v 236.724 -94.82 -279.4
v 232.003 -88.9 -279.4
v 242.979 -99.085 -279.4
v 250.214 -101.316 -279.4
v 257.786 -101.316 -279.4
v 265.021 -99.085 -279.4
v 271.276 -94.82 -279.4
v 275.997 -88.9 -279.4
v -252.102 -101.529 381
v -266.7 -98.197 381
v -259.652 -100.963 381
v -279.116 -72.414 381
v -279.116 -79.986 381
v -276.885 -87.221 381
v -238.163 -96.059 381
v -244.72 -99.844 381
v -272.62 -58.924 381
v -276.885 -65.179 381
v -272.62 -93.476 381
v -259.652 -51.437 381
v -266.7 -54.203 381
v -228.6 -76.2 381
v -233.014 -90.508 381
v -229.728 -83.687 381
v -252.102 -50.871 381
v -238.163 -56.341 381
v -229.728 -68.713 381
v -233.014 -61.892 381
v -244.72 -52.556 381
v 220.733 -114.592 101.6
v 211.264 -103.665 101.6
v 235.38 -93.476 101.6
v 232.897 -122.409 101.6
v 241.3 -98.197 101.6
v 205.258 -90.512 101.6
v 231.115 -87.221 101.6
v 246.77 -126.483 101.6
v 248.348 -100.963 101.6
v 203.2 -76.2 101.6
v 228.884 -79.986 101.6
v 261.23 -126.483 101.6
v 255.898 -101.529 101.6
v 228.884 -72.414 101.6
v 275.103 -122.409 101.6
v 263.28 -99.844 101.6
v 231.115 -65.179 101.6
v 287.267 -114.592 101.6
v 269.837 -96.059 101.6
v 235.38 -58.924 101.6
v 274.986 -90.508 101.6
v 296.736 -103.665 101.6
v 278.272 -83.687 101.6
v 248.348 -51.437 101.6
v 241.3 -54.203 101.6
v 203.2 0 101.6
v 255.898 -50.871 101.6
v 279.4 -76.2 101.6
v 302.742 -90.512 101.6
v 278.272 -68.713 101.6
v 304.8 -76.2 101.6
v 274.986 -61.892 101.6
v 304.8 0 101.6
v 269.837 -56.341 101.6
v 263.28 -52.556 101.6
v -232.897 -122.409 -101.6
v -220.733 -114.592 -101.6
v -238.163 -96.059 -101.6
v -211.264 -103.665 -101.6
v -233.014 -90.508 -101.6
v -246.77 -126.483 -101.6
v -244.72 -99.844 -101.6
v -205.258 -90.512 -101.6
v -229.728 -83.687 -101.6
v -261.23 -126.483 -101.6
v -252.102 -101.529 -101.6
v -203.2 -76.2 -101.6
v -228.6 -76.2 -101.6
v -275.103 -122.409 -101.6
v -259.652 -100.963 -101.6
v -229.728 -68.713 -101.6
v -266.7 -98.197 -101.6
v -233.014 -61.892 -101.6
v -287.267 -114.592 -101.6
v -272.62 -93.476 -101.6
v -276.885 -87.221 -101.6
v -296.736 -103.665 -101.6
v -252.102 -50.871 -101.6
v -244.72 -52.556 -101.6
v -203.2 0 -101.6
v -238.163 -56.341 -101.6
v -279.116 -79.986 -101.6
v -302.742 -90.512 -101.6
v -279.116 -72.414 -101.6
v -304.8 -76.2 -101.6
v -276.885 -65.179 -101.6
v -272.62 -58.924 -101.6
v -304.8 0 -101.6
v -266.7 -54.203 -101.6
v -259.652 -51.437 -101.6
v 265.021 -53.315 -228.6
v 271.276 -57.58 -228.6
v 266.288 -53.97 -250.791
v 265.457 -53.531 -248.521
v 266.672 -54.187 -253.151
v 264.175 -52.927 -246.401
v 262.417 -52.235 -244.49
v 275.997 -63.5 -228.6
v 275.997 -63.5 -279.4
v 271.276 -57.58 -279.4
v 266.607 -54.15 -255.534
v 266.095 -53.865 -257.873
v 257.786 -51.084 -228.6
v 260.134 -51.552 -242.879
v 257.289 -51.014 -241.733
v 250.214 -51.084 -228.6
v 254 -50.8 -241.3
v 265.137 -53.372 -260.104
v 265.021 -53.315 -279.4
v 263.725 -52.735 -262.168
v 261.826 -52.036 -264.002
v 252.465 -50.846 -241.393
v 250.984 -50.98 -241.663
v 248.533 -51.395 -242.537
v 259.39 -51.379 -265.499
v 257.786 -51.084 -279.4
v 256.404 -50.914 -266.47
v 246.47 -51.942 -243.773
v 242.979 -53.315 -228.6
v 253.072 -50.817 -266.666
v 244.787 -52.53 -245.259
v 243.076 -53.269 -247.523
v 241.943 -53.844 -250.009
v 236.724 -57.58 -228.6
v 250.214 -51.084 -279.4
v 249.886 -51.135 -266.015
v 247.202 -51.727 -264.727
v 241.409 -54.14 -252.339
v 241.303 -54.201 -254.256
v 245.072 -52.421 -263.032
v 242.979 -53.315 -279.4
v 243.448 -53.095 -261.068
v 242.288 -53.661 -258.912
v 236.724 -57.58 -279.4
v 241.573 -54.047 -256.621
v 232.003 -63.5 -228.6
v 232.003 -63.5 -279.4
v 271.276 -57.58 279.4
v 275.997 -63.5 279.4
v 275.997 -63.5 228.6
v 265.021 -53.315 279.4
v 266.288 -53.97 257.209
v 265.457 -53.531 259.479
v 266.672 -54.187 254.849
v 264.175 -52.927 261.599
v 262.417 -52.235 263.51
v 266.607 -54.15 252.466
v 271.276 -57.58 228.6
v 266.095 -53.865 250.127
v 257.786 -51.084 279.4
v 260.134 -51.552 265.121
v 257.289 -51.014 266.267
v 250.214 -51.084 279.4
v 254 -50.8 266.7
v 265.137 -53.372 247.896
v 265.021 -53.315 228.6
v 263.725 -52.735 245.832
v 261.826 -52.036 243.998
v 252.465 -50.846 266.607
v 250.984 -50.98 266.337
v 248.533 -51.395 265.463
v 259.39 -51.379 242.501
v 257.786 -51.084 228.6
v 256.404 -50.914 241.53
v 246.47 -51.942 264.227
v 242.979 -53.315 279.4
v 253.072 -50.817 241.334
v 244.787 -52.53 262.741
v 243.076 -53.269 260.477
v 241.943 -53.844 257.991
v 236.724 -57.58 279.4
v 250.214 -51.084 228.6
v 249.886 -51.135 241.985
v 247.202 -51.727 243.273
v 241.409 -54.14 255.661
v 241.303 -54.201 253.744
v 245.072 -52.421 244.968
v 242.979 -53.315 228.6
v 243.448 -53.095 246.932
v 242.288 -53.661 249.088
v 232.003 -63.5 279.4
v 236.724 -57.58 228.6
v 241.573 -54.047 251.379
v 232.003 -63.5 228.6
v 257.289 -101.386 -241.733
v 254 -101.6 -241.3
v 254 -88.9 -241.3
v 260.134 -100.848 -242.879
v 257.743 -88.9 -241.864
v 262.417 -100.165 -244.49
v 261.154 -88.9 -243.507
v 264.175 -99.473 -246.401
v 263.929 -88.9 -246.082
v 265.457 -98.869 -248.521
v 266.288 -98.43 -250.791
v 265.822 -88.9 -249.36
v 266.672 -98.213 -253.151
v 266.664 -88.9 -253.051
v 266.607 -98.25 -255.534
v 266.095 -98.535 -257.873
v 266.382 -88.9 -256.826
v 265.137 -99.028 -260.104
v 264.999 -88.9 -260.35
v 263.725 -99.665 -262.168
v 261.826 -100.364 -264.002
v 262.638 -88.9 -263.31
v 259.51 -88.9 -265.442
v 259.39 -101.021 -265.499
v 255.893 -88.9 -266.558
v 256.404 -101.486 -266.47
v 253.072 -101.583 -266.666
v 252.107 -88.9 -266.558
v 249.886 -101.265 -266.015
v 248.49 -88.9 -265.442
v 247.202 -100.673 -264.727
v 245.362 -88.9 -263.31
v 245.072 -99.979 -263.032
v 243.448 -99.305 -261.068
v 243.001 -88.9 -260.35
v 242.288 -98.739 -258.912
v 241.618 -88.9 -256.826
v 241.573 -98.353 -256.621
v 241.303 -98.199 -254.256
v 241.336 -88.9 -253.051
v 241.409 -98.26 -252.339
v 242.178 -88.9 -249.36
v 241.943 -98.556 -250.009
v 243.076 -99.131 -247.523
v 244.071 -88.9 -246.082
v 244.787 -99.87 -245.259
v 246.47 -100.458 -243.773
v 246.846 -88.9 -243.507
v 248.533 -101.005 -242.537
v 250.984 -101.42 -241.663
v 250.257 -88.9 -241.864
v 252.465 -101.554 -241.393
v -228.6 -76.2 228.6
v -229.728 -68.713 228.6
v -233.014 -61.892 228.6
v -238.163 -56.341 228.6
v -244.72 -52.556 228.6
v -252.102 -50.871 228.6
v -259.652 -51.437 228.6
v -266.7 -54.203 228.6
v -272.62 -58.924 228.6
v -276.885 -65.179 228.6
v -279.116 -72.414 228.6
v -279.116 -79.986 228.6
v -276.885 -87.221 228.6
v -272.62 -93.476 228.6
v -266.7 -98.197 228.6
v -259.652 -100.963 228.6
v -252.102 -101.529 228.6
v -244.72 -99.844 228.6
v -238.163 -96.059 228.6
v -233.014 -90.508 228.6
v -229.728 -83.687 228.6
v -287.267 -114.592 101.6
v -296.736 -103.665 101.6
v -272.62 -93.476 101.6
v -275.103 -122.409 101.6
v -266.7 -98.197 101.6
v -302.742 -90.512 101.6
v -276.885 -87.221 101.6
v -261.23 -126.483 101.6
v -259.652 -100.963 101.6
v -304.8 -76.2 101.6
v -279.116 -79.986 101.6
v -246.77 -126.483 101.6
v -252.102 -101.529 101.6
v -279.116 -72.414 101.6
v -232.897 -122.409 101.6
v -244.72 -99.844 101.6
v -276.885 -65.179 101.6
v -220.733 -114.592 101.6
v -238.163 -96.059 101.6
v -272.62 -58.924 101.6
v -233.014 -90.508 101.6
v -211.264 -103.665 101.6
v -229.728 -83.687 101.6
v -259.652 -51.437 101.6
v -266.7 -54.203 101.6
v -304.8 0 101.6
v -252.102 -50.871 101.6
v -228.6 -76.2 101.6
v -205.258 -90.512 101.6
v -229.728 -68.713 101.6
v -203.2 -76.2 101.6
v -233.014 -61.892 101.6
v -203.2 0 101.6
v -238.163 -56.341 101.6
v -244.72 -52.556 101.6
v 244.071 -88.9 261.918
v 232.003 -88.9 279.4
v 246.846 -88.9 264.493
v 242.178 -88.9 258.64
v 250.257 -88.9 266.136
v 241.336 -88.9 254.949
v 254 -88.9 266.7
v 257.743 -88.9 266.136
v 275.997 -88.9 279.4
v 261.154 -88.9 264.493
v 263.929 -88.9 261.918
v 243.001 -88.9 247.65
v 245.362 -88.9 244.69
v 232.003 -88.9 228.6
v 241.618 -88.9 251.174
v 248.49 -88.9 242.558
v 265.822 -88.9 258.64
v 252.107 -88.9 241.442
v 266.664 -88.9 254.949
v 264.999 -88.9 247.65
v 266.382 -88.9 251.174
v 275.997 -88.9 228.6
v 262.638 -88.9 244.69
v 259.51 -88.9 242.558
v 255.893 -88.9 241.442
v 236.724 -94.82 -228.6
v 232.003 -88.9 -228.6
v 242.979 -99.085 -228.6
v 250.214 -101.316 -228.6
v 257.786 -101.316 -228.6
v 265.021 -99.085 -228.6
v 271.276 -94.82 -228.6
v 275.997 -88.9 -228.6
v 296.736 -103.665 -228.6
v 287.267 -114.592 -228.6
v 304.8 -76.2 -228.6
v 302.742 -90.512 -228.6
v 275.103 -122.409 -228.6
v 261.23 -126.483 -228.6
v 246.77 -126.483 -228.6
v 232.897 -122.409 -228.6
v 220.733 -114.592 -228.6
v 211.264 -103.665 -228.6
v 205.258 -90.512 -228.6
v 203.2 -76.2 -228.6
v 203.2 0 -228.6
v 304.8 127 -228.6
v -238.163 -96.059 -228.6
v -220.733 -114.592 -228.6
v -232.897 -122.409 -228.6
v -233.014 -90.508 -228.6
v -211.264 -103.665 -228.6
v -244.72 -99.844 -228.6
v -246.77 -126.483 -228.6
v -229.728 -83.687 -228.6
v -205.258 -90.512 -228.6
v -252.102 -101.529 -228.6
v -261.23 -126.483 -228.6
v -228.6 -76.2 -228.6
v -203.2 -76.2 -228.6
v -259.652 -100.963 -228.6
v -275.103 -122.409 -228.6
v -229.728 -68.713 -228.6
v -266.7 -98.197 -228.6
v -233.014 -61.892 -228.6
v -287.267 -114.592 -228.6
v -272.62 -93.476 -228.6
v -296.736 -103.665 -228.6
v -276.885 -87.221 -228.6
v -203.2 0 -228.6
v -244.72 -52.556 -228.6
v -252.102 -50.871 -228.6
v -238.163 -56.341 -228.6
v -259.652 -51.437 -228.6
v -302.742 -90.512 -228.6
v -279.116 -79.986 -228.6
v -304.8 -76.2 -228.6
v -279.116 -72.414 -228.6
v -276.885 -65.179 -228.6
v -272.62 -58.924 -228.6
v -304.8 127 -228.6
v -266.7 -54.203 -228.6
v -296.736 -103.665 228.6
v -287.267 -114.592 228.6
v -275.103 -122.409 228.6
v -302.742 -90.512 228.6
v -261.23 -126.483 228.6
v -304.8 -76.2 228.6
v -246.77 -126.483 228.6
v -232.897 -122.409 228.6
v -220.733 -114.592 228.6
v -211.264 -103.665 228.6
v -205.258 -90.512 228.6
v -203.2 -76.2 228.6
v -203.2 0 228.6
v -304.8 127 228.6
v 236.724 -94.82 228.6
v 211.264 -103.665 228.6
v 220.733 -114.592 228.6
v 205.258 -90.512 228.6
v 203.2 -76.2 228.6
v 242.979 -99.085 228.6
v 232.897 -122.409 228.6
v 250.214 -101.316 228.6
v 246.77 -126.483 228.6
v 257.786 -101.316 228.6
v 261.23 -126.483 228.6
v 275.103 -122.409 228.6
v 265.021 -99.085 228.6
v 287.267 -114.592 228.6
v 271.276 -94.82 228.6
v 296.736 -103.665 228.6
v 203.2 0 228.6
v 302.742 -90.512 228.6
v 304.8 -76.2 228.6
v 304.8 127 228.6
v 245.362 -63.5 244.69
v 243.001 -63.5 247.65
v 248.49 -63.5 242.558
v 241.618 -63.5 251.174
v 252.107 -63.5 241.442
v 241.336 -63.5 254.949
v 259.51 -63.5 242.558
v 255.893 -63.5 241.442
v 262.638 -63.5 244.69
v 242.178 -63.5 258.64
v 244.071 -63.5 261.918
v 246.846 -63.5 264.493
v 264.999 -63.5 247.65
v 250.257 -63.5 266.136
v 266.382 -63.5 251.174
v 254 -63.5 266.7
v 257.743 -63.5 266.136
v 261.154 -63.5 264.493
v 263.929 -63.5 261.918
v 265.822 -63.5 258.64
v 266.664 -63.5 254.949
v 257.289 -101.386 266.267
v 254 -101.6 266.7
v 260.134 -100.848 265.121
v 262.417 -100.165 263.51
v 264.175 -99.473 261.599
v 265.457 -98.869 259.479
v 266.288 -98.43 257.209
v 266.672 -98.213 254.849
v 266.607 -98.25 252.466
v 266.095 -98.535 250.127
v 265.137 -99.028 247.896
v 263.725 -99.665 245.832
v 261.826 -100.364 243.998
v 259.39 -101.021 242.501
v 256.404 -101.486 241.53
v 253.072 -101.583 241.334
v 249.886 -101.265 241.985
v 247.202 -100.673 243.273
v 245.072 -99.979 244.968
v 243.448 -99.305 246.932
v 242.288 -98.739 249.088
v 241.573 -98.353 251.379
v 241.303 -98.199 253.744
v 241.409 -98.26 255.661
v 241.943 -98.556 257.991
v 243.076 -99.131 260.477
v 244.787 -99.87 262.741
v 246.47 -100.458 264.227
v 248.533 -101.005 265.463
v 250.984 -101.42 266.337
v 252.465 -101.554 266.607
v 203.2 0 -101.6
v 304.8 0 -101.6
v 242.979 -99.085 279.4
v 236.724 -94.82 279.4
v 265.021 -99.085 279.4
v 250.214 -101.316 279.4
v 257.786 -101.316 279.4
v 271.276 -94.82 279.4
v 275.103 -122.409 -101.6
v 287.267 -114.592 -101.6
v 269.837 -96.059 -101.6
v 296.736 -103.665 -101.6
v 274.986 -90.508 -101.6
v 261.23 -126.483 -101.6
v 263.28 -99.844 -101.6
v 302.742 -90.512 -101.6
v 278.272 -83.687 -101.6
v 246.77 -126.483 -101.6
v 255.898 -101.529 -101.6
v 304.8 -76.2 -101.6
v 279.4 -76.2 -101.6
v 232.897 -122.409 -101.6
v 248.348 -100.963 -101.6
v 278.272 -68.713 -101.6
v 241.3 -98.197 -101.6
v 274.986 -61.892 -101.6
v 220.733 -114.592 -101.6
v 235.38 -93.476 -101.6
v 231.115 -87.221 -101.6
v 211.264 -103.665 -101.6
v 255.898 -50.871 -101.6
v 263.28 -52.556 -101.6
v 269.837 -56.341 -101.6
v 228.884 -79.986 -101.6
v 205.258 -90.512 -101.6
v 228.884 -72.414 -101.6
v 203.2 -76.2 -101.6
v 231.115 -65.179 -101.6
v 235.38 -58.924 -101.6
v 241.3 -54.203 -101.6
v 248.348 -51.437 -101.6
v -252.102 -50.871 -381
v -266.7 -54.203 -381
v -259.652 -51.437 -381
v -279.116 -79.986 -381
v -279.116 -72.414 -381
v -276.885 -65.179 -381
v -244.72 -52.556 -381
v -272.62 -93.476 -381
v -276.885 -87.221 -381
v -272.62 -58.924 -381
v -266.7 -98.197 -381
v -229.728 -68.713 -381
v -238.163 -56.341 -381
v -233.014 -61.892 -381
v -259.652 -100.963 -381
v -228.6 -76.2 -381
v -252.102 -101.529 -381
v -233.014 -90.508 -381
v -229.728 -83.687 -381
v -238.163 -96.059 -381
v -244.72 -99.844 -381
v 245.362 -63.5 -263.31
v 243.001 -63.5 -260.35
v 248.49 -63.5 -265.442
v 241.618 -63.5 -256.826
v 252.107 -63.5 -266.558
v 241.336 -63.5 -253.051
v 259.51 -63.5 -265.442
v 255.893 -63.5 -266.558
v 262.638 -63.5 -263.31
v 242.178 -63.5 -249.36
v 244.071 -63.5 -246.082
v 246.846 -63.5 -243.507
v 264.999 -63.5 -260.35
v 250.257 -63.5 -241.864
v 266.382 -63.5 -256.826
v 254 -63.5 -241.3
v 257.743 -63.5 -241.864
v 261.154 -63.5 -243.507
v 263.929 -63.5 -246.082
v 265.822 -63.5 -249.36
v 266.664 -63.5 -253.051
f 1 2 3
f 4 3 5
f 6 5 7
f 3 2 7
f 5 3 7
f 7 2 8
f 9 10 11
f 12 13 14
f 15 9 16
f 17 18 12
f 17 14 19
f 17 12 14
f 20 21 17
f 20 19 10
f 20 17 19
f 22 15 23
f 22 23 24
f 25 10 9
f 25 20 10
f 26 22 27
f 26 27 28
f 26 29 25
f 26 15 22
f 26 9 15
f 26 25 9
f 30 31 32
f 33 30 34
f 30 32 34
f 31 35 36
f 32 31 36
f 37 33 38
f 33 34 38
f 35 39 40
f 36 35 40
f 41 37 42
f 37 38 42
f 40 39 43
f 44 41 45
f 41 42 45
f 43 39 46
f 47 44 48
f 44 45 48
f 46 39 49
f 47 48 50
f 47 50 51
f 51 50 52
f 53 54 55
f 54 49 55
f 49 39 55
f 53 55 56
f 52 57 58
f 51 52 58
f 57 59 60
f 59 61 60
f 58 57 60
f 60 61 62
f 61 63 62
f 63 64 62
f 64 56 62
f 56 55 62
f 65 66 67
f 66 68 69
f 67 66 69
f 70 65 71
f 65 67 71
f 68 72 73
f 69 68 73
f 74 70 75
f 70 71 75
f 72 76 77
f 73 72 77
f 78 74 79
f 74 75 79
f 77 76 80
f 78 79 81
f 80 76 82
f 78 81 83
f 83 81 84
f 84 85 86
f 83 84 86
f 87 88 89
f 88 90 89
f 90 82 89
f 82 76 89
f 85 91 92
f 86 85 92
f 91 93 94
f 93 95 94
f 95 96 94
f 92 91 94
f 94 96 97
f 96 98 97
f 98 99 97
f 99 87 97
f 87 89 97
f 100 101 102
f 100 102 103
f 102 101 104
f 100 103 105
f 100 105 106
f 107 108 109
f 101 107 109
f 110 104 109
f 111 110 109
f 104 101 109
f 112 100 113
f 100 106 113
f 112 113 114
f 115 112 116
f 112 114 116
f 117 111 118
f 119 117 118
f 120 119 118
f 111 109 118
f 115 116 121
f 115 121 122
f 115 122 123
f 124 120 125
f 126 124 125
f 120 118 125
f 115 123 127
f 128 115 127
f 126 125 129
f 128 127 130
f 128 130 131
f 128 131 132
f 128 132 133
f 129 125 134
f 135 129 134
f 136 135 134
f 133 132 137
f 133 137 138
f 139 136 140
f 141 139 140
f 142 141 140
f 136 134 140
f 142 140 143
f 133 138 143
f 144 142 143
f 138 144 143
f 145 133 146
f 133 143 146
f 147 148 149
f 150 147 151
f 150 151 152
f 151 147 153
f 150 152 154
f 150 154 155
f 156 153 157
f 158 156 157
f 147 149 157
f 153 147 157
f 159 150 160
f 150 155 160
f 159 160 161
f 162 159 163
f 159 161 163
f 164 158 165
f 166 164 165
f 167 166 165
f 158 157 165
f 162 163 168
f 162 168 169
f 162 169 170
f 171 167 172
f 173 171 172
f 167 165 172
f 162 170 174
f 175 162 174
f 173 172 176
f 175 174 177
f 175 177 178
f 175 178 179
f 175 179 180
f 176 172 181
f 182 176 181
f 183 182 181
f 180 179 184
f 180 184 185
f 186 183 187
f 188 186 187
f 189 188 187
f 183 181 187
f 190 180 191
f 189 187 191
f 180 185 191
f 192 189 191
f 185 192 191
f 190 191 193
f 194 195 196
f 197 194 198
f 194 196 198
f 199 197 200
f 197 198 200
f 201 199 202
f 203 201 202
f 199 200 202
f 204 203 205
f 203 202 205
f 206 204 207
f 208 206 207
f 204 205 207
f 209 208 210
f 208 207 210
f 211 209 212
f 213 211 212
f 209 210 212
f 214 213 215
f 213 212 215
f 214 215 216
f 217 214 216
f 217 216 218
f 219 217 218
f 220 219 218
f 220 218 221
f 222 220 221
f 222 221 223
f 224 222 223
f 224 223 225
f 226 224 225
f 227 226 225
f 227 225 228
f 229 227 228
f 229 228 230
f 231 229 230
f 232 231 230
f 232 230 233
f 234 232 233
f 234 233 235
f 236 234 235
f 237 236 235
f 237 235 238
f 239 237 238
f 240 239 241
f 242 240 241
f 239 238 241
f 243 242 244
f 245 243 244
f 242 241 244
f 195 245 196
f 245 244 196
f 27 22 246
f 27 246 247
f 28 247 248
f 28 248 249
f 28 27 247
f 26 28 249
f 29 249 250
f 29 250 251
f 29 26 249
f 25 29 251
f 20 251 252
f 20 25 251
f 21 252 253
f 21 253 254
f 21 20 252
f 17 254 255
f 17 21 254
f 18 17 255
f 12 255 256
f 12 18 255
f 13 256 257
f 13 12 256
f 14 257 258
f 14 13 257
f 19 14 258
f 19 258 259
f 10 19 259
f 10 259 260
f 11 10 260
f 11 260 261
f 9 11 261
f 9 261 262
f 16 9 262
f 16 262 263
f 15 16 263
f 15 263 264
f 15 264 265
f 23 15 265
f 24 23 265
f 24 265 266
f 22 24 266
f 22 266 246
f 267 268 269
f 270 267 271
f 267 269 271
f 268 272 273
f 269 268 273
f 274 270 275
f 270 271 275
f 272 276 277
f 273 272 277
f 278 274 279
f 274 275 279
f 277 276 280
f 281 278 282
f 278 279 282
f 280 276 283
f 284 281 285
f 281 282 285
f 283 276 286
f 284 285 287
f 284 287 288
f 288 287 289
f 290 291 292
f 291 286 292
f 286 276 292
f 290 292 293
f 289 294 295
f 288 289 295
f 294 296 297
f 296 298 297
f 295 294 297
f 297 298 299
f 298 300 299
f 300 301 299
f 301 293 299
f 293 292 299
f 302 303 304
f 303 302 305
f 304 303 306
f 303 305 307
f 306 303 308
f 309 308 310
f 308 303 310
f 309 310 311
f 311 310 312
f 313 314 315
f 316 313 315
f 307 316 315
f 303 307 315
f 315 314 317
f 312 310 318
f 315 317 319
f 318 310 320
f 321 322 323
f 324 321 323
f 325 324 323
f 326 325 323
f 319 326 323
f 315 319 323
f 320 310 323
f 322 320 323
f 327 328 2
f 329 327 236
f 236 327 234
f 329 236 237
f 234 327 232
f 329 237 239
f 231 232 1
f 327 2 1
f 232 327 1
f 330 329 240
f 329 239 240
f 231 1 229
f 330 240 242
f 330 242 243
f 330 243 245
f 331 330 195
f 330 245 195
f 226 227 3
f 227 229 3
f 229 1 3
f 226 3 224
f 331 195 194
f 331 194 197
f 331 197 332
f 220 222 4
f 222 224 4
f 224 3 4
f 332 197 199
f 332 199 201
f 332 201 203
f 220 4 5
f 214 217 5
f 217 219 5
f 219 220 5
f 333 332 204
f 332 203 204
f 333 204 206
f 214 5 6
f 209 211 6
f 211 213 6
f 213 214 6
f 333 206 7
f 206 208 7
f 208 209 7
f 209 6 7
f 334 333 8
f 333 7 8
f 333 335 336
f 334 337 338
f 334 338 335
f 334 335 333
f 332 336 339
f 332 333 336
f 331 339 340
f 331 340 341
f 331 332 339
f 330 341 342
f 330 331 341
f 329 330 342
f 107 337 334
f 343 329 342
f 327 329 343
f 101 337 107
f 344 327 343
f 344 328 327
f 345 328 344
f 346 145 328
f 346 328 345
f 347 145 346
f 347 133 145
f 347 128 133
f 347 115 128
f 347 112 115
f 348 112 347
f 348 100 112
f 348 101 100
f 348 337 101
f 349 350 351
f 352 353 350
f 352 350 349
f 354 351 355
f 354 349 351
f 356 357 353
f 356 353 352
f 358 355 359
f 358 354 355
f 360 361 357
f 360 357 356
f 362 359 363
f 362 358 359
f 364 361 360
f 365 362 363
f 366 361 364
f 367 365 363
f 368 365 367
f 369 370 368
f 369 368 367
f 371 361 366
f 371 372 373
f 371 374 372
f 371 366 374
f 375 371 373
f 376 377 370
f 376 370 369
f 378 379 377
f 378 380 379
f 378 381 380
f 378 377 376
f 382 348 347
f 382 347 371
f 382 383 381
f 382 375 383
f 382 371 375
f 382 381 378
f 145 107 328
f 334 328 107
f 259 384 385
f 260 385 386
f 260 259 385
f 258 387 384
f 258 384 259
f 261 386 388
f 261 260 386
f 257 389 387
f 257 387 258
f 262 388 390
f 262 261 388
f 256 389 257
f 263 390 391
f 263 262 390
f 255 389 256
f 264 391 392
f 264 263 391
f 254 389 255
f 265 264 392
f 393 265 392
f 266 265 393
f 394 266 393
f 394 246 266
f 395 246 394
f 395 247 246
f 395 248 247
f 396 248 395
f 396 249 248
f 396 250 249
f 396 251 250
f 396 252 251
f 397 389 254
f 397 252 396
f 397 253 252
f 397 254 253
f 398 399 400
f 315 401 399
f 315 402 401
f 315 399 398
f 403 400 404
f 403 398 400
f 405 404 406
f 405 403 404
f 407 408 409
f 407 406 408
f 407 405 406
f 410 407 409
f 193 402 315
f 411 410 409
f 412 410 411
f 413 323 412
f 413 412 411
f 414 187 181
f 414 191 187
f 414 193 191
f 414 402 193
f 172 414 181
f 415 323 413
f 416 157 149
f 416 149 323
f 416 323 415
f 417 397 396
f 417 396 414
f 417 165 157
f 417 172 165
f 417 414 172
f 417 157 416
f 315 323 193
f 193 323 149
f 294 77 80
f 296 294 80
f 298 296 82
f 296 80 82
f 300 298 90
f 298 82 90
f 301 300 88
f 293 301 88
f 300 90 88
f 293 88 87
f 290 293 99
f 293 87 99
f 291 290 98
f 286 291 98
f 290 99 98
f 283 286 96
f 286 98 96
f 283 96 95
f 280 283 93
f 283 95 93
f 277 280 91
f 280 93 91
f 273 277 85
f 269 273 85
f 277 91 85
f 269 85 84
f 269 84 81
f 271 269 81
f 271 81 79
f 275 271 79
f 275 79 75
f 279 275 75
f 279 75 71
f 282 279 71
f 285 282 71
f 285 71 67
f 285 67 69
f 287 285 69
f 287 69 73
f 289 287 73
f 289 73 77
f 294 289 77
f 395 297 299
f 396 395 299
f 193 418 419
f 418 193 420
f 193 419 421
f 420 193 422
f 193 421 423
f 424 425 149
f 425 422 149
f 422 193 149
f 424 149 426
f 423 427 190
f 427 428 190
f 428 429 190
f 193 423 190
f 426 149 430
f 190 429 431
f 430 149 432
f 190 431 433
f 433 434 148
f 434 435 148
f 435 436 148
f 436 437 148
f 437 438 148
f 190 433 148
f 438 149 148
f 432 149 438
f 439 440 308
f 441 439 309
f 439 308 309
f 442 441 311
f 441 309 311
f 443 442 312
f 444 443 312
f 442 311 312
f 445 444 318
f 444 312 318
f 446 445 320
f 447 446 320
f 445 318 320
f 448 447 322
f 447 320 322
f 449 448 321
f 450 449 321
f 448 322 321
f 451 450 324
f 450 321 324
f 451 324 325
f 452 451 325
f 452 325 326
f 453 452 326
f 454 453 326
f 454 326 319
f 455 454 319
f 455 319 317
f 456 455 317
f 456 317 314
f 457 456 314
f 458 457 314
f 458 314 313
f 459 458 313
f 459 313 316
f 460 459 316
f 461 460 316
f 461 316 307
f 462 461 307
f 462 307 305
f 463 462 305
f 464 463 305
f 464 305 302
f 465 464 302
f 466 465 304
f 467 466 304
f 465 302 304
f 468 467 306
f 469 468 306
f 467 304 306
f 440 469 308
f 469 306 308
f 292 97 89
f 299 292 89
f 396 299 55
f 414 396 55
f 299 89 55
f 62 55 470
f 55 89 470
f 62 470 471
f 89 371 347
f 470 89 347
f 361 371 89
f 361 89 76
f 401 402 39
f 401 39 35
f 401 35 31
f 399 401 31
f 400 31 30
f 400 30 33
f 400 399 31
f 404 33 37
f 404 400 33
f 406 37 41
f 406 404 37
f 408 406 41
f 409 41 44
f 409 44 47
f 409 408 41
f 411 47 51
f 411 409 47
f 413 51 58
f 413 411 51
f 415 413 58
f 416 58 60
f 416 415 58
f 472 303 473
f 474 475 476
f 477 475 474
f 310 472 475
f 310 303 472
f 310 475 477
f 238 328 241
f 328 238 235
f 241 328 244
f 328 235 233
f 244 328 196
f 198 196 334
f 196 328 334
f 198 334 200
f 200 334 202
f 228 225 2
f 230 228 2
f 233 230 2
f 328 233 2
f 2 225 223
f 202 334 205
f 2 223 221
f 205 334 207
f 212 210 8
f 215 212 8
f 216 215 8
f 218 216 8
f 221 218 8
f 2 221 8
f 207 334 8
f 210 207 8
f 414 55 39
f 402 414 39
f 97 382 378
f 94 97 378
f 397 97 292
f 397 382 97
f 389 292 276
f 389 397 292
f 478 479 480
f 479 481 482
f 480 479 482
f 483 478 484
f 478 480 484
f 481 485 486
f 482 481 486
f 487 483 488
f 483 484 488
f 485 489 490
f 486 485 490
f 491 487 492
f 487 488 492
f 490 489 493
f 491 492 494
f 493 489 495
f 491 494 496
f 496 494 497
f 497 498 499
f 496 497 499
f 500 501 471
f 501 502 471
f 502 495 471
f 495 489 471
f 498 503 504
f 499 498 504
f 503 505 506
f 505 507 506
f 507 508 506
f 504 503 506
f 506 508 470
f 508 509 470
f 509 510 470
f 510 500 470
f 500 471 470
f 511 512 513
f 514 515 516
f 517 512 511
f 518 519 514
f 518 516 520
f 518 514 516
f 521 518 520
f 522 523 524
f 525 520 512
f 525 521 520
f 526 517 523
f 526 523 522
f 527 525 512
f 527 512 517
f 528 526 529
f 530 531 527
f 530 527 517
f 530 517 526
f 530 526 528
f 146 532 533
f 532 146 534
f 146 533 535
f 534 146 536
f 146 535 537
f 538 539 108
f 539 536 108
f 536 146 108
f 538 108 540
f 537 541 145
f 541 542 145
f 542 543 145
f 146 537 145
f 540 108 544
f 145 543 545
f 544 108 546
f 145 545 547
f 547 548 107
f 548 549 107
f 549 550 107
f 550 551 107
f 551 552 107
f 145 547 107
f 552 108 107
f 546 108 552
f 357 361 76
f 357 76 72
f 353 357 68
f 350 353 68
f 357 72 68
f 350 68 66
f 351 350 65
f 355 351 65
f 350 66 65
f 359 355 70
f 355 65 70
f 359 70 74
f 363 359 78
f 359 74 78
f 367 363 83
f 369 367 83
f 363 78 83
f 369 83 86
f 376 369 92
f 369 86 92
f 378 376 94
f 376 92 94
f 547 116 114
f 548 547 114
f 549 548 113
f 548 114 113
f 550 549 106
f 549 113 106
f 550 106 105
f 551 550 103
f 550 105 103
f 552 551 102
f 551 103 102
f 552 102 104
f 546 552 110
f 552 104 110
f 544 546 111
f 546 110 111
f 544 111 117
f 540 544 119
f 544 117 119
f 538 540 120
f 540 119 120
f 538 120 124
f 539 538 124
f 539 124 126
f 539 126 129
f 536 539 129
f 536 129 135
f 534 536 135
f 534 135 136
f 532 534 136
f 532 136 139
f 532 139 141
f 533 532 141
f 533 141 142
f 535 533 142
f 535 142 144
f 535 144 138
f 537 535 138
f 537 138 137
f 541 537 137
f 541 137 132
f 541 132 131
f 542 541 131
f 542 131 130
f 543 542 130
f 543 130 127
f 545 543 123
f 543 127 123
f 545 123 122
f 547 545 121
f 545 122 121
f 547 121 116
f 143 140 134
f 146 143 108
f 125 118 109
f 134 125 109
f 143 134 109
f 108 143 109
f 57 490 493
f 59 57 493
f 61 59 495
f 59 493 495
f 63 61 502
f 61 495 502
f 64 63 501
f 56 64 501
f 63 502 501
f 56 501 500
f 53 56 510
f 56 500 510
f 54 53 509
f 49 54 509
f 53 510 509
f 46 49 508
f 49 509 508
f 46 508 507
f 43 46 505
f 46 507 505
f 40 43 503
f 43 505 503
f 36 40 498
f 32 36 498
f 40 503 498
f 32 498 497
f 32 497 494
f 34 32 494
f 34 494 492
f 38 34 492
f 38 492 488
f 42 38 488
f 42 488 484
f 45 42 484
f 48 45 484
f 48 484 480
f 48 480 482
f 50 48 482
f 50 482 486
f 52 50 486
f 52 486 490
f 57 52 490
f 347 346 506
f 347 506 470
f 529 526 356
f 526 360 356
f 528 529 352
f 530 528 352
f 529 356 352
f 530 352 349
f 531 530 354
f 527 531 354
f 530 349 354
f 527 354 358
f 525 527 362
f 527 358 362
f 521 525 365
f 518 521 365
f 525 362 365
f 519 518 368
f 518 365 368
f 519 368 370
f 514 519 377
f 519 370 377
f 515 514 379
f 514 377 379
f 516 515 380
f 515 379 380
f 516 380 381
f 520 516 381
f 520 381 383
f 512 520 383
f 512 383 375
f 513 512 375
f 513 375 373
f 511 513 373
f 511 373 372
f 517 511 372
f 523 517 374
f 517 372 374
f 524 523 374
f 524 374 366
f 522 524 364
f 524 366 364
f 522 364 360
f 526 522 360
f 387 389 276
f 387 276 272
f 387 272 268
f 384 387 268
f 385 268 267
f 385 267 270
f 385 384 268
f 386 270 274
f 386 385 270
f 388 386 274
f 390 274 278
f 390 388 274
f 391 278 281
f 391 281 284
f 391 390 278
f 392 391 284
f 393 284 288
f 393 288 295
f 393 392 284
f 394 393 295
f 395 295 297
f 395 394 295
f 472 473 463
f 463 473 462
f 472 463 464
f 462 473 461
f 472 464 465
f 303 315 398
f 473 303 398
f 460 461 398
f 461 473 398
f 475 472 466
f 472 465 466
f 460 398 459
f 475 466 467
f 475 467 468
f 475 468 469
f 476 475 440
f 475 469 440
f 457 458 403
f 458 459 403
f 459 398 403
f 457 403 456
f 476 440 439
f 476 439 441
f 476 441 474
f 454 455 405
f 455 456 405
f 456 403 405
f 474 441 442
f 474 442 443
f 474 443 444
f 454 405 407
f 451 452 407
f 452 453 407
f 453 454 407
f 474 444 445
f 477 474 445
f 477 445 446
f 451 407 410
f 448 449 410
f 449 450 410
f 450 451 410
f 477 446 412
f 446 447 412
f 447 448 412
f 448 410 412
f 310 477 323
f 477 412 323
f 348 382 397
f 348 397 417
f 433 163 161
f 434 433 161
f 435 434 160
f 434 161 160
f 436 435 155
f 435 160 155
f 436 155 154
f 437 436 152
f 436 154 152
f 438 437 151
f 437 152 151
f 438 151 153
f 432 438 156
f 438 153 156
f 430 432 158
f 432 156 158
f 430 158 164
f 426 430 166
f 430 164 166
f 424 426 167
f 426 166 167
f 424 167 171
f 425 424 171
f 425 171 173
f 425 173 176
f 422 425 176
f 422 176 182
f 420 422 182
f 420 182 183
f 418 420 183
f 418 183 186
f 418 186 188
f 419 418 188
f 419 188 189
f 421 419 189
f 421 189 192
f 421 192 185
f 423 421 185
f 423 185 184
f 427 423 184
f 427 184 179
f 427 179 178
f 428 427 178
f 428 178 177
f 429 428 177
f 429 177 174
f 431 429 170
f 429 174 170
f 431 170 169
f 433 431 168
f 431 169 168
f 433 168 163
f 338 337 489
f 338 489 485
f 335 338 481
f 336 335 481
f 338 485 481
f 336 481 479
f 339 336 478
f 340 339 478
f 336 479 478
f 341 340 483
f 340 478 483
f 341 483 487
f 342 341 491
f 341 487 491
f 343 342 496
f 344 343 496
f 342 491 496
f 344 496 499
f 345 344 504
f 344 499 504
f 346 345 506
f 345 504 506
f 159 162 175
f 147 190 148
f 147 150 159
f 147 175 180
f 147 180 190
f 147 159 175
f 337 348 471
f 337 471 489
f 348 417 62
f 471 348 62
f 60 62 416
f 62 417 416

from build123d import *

# Parameters (mm, degrees)
SKETCH1_W                = 609.6
SKETCH1_H                = 457.2
BOSS_EXTRUDE1_DEPTH      = 127
SKETCH2_R                = 50.8
SKETCH2_R_2              = 25.4
BOSS_EXTRUDE2_DEPTH      = 127
BOSS_EXTRUDE3_START      = -127
SKETCH3_R                = 25.4
BOSS_EXTRUDE3_DEPTH      = 127
BOSS_EXTRUDE4_DEPTH      = 50.8
BOSS_EXTRUDE4_DEPTH_BACK = 508
SKETCH5_R                = 25.4
SKETCH6_R                = 12.7
CUT_EXTRUDE1_DEPTH       = 486.266318633
CUT_EXTRUDE2_DEPTH       = 101.6
SKETCH8_R                = 25.4
BOSS_EXTRUDE5_DEPTH      = 101.6
BOSS_EXTRUDE6_START      = 101.6
SKETCH9_R                = 25.4
BOSS_EXTRUDE6_DEPTH      = 101.6


with BuildPart() as part:
    # Sketch1 → Boss-Extrude1 (new body)
    with BuildSketch(Plane(origin=(0, 0, 0), x_dir=(1, 0, 0), z_dir=(0, 1, 0))):
        Rectangle(SKETCH1_W, SKETCH1_H)
    extrude(amount=BOSS_EXTRUDE1_DEPTH)

    # Sketch2 → Boss-Extrude2 (add)
    # profile 1 of 4: a face of its own
    with BuildSketch(Plane.XY.offset(228.6)):
        with BuildLine():
            Line((-203.2, -76.2), (-203.2, 0))
            Line((-203.2, 0), (-304.8, 0))
            Line((-304.8, 0), (-304.8, -76.2))
            ThreePointArc((-304.8, -76.2), (-254, -25.4), (-203.2, -76.2))
        make_face()
    # profile 2 of 4: a face of its own
    with BuildSketch(Plane.XY.offset(228.6)):
        with Locations((-254, -76.2)):
            Circle(SKETCH2_R)
        with Locations((-254, -76.2)):
            Circle(SKETCH2_R_2, mode=Mode.SUBTRACT)
    # profile 3 of 4: a face of its own
    with BuildSketch(Plane.XY.offset(228.6)):
        with Locations((254, -76.2)):
            Circle(SKETCH2_R)
        with Locations((254, -76.2)):
            Circle(SKETCH2_R_2, mode=Mode.SUBTRACT)
    # profile 4 of 4: a face of its own
    with BuildSketch(Plane.XY.offset(228.6)):
        with BuildLine():
            Line((304.8, -76.2), (304.8, 0))
            Line((304.8, 0), (203.2, 0))
            Line((203.2, 0), (203.2, -76.2))
            ThreePointArc((203.2, -76.2), (254, -25.4), (304.8, -76.2))
        make_face()
    extrude(amount=-BOSS_EXTRUDE2_DEPTH)

    # Sketch3 → Boss-Extrude3 (add)
    # profile 1 of 2: a face of its own
    with BuildSketch(Plane(origin=(0, 0, -228.6), x_dir=(-1, 0, 0), z_dir=(0, 0, -1)).offset(BOSS_EXTRUDE3_START)):
        with BuildLine():
            Line((-203.2, -76.2), (-203.2, 0))
            Line((-203.2, 0), (-304.8, 0))
            Line((-304.8, 0), (-304.8, -76.2))
            ThreePointArc((-304.8, -76.2), (-254, -127), (-203.2, -76.2))
        make_face()
        with Locations(Location((-254, -76.2, 0), (0, 0, 180))):
            Circle(SKETCH3_R, mode=Mode.SUBTRACT)
    # profile 2 of 2: a face of its own
    with BuildSketch(Plane(origin=(0, 0, -228.6), x_dir=(-1, 0, 0), z_dir=(0, 0, -1)).offset(BOSS_EXTRUDE3_START)):
        with BuildLine():
            Line((304.8, -76.2), (304.8, 0))
            Line((304.8, 0), (203.2, 0))
            Line((203.2, 0), (203.2, -76.2))
            ThreePointArc((203.2, -76.2), (254, -127), (304.8, -76.2))
        make_face()
        with Locations(Location((254, -76.2, 0), (0, 0, 180))):
            Circle(SKETCH3_R, mode=Mode.SUBTRACT)
    extrude(amount=BOSS_EXTRUDE3_DEPTH)

    # Sketch5 → Boss-Extrude4 (add, two sides: drawn at the far end of the back side and taken through both)
    with BuildSketch(Plane.XY.offset(228.6).offset(-BOSS_EXTRUDE4_DEPTH_BACK)):
        with Locations((254, -76.2)):
            Circle(SKETCH5_R)
        with Locations((-254, -76.2)):
            Circle(SKETCH5_R)
    extrude(amount=BOSS_EXTRUDE4_DEPTH + BOSS_EXTRUDE4_DEPTH_BACK)

    # Sketch6 → Cut-Extrude1 (cut, through all)
    with BuildSketch(Plane(origin=(0, 127, 0), x_dir=(1, 0, 0), z_dir=(0, 1, 0))):
        with Locations(Location((254, -254, 0), (0, 0, 270))):
            Circle(SKETCH6_R)
        with Locations(Location((254, 254, 0), (0, 0, 270))):
            Circle(SKETCH6_R)
    extrude(amount=-CUT_EXTRUDE1_DEPTH, mode=Mode.SUBTRACT)

    # Sketch7 → Cut-Extrude2 (cut)
    with BuildSketch(Plane(origin=(304.8, 0, 0), x_dir=(0, 0, -1), z_dir=(1, 0, 0))):
        Polygon((-228.6, -63.5), (-330.2, -63.5), (-330.2, -88.9), (-228.6, -88.9), (-228.6, -76.2), align=None)
        Polygon((279.4, -88.9), (279.4, -63.5), (228.6, -63.5), (228.6, -76.2), (228.6, -88.9), align=None)
    extrude(amount=-CUT_EXTRUDE2_DEPTH, mode=Mode.SUBTRACT)

    # Sketch8 → Boss-Extrude5 (add)
    with BuildSketch(Plane(origin=(0, 0, -279.4), x_dir=(-1, 0, 0), z_dir=(0, 0, -1))):
        with Locations(Location((254, -76.2, 0), (0, 0, 180))):
            Circle(SKETCH8_R)
    extrude(amount=BOSS_EXTRUDE5_DEPTH)

    # Sketch9 → Boss-Extrude6 (add)
    with BuildSketch(Plane.XY.offset(279.4).offset(BOSS_EXTRUDE6_START)):
        with Locations((-254, -76.2)):
            Circle(SKETCH9_R)
    extrude(amount=-BOSS_EXTRUDE6_DEPTH)


solid = part.part
